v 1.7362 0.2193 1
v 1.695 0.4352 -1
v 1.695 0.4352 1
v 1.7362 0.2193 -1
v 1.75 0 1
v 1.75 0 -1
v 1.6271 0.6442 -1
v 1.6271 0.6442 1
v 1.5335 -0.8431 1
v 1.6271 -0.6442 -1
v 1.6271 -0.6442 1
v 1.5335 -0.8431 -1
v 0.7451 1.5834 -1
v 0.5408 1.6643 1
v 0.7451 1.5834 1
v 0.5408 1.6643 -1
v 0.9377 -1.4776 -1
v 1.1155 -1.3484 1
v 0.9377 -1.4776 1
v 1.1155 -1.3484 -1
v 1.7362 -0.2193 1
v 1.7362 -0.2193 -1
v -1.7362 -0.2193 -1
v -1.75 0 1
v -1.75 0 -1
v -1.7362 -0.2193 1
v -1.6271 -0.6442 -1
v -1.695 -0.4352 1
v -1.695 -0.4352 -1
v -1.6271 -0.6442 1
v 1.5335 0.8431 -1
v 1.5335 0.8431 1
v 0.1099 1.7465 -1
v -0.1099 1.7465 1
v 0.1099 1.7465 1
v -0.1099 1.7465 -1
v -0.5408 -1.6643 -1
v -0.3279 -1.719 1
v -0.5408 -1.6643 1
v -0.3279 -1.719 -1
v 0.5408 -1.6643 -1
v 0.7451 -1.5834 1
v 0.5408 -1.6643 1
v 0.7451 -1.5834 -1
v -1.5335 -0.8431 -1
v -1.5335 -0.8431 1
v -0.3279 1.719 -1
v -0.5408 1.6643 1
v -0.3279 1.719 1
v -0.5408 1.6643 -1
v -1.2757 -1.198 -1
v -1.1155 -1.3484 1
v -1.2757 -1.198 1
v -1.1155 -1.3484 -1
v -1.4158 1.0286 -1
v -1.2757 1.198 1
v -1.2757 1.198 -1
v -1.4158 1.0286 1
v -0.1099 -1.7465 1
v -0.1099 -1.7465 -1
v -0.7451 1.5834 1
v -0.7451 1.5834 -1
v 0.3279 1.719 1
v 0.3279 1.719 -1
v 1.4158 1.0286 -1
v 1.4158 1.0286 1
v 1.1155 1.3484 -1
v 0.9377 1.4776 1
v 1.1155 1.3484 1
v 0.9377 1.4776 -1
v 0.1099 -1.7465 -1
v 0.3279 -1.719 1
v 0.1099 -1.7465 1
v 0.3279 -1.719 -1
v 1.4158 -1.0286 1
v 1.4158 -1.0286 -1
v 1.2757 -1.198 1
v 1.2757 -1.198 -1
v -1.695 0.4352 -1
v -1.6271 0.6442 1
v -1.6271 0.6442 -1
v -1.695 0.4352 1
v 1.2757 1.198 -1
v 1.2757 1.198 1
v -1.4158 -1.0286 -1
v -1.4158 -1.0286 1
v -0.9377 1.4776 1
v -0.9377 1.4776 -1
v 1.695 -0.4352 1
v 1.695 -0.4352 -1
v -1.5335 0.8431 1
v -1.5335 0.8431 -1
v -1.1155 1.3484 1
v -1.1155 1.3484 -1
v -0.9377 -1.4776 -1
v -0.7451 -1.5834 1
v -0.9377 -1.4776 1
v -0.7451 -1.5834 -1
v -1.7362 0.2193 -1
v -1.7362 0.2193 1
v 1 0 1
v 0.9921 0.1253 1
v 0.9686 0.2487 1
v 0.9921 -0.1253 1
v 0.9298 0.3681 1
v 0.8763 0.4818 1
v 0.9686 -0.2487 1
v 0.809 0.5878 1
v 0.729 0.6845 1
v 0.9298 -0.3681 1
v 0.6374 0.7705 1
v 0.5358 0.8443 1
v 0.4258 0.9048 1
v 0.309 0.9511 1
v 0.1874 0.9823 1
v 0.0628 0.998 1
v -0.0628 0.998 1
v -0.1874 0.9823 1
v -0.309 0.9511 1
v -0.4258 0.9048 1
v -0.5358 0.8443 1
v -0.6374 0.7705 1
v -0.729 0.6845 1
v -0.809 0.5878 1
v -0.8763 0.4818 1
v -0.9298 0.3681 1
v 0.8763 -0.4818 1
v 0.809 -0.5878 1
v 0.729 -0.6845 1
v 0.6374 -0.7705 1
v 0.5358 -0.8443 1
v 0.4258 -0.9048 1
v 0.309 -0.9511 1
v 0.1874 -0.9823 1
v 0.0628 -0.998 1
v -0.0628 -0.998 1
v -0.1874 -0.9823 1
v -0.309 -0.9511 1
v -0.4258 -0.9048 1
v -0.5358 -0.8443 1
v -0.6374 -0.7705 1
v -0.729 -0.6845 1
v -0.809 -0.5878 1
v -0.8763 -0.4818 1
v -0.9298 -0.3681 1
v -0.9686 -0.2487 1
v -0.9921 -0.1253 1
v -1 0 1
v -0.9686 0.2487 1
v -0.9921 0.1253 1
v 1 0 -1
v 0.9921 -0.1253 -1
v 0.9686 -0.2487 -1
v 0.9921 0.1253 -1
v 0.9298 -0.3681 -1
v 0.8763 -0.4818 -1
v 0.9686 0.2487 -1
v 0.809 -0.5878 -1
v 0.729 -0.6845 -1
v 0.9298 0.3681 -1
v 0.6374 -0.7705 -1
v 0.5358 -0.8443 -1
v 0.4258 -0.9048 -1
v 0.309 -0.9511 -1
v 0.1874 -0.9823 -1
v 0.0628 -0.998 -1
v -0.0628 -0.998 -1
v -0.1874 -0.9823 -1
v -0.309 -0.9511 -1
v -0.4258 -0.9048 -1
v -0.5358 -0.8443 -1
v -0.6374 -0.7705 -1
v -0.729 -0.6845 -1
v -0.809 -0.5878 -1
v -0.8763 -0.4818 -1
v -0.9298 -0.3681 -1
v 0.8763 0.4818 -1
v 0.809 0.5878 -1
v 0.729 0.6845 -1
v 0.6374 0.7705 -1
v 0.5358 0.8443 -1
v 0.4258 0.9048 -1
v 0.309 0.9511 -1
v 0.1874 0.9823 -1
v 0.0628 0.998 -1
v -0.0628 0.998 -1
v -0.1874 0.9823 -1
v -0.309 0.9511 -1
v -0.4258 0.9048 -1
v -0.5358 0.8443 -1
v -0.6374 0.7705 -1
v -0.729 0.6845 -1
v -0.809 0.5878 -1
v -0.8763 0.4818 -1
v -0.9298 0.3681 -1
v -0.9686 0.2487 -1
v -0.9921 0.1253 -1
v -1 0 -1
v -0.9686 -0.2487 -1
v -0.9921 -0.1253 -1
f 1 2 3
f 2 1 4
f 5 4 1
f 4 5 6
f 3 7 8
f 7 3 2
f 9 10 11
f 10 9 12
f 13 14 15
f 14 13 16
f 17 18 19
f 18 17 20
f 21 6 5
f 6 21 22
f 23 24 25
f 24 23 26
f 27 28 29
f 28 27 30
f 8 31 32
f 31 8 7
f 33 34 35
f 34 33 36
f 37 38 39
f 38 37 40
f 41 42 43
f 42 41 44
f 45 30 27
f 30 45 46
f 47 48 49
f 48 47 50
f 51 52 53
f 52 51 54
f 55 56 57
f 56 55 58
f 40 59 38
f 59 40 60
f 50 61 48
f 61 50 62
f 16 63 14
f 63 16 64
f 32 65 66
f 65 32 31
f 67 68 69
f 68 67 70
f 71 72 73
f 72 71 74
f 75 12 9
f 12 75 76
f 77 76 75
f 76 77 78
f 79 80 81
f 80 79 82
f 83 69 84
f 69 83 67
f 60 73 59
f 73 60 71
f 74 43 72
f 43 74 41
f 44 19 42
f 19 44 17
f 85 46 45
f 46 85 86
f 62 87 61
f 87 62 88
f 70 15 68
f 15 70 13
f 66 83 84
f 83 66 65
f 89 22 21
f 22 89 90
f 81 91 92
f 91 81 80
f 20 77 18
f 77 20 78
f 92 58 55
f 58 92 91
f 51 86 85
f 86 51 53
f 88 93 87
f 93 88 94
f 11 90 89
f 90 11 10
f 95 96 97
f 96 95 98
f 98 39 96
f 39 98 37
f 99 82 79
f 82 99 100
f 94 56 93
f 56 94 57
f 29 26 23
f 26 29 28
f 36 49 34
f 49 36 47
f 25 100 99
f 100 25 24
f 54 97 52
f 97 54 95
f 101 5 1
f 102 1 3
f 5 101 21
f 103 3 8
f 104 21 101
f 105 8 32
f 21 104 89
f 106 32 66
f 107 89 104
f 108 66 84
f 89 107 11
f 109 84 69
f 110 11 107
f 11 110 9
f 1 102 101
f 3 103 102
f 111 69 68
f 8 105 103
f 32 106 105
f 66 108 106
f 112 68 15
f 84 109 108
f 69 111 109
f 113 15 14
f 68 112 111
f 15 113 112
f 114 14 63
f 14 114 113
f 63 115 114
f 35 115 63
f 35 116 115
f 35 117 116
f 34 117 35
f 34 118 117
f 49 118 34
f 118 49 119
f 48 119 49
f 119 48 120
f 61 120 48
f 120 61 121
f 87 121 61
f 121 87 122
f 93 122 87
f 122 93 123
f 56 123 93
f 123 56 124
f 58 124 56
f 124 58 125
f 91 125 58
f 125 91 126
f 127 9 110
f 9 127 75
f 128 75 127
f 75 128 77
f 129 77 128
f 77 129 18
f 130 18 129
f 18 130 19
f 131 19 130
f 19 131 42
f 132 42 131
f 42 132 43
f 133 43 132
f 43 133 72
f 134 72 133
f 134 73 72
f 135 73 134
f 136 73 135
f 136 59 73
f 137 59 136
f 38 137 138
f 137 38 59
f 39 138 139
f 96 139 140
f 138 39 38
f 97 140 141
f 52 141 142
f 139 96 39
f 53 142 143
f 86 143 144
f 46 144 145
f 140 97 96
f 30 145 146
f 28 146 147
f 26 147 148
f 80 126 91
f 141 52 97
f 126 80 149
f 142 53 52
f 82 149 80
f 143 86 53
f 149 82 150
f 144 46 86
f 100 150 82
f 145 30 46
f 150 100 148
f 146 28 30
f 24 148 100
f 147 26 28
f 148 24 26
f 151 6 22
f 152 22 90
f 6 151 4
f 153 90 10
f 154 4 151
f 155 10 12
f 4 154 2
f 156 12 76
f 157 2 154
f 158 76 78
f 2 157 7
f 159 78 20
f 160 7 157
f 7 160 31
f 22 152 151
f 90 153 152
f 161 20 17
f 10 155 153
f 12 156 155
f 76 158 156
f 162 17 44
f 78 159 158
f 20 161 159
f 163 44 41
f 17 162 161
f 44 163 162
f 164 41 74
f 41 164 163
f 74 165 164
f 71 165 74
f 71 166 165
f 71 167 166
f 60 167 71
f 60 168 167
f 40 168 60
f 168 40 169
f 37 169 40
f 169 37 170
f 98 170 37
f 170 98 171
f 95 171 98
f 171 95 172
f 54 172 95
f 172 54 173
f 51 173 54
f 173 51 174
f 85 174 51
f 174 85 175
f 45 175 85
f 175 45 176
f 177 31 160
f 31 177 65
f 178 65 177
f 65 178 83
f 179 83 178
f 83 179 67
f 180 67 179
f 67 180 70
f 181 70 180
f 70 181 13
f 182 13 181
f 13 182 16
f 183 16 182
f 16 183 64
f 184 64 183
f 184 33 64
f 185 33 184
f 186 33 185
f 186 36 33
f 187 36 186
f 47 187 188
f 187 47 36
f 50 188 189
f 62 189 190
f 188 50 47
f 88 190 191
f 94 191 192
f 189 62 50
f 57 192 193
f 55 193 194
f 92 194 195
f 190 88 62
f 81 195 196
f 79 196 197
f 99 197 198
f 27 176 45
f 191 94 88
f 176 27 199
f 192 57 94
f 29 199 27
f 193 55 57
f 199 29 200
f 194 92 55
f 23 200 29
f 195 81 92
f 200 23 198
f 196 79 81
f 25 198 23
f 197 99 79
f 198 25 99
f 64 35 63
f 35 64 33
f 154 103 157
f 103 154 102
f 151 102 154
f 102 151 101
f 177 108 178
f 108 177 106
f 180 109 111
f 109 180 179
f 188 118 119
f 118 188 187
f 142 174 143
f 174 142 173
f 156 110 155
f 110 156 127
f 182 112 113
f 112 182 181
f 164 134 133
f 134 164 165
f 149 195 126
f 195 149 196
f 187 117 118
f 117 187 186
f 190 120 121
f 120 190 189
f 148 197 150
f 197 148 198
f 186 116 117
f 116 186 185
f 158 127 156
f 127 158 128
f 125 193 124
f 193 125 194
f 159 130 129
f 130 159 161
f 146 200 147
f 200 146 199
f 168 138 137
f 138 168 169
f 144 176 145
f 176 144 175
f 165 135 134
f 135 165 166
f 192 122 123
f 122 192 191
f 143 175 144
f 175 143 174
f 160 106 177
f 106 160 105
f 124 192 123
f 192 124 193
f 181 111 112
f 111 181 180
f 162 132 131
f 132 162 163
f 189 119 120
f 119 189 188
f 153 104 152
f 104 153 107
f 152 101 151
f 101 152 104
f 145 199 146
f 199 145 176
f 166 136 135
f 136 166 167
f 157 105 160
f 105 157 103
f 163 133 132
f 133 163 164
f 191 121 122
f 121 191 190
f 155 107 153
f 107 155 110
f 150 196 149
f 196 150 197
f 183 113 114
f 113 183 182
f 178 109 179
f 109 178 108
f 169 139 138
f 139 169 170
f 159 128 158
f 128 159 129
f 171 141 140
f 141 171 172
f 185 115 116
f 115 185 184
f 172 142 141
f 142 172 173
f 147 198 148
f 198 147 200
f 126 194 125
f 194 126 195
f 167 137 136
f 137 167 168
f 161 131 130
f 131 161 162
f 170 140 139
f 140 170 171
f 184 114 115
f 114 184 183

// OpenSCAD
$fn = 50;


difference() {
	union() {
		translate(v = [0, 0, -1.0000000000]) {
			cylinder(h = 2, r = 1.7500000000);
		}
	}
	union() {
		translate(v = [0, 0, -100.0000000000]) {
			cylinder(h = 200, r = 1.0000000000);
		}
	}
}
